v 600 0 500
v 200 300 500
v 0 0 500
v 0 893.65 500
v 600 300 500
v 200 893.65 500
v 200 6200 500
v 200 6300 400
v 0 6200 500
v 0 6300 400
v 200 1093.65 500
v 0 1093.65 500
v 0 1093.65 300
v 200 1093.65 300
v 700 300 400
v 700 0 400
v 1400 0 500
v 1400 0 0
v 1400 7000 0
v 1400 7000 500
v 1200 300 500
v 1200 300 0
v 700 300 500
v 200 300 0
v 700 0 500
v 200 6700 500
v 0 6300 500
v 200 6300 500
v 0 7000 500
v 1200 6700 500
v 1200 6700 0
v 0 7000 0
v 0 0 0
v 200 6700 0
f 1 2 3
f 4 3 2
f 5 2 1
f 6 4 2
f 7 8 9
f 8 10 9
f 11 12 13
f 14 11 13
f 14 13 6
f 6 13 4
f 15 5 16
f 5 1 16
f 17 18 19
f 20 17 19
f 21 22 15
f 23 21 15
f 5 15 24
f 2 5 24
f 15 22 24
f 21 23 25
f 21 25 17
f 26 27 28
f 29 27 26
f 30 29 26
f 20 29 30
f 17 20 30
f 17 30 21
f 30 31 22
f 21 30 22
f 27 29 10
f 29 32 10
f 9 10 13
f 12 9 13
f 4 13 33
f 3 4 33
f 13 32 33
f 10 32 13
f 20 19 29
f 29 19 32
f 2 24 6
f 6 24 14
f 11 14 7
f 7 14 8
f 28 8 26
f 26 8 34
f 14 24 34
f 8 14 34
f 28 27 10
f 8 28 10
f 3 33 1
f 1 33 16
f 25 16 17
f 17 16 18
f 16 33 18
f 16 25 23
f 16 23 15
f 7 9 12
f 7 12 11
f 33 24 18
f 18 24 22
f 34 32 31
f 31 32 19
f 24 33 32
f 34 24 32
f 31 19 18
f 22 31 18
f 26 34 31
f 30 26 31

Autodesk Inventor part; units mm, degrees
ref_plane "YZ Plane" through (0, 0, 0) normal (1, 0, 0) x (0, 1, 0)
ref_plane "XZ Plane" through (0, 0, 0) normal (0, 1, 0) x (-1, 0, 0)
ref_plane "Pracovní rovina1" through (0, 0, 0) normal (0, 0, 1) x (1, 0, 0)
sketch "Náčrt1" plane through (0, 0, 0) normal (0, 0, 1) x (1, 0, 0)
  line L0 (0, 0) -> (1400, 0)
  line L1 (1400, 0) -> (1400, 7000)
  line L2 (1400, 7000) -> (0, 7000)
  line L3 (0, 7000) -> (0, 0)
  line L4 (200, 6700) -> (1200, 6700)
  line L5 (1200, 6700) -> (1200, 300)
  line L6 (1200, 300) -> (200, 300)
  line L7 (200, 300) -> (200, 6700)
  dimension "d13" = 7000
  dimension "d14" = 1000
  dimension "d15" = 300
  dimension "d16" = 300
  dimension "d17" = 200
  dimension "d18" = 200
extrude "Vysunutí1" add sketch "Náčrt1" along normal blind 500
sketch "Náčrt2" plane through (0, 6700, 0) normal (-1, 0, 0) x (0, 1, 0)
  line L0 (-400, -500) -> (-400, -400)
  line L1 (-400, -400) -> (-500, -500)
  line L2 (-500, -500) -> (-400, -500)
  line L3 (300, -500) -> (-6700, -500) projected
  line L4 (300, 0) -> (300, -500) projected
  line L5 (-5606.35, -500) -> (-5606.35, -300)
  line L6 (-5606.35, -300) -> (-5806.35, -500)
  line L7 (-5606.35, -500) -> (-5806.35, -500)
  point P0 (-6700, 0)
  dimension "d7" = 100
  dimension "d19" = 700
  dimension "d24" = 45
  dimension "d25" = 5206.35
  dimension "d26" = 200
extrude "Vysunutí2" cut sketch "Náčrt2" against normal blind 293.5
sketch "Náčrt3" plane through (0, 0, 0) normal (0, -1, 0) x (1, 0, 0)
  line L0 (0, 500) -> (1400, 500) projected
  line L1 (600, 500) -> (700, 400)
  line L2 (700, 500) -> (700, 400)
  point P0 (0, 0)
  dimension "d20" = 45
  dimension "d21" = 100
extrude "Vysunutí3" cut sketch "Náčrt3" against normal blind 358
equation "\"d16\" = d15"
equation "\"d18\" = d17"
properties part number "B1-X"
